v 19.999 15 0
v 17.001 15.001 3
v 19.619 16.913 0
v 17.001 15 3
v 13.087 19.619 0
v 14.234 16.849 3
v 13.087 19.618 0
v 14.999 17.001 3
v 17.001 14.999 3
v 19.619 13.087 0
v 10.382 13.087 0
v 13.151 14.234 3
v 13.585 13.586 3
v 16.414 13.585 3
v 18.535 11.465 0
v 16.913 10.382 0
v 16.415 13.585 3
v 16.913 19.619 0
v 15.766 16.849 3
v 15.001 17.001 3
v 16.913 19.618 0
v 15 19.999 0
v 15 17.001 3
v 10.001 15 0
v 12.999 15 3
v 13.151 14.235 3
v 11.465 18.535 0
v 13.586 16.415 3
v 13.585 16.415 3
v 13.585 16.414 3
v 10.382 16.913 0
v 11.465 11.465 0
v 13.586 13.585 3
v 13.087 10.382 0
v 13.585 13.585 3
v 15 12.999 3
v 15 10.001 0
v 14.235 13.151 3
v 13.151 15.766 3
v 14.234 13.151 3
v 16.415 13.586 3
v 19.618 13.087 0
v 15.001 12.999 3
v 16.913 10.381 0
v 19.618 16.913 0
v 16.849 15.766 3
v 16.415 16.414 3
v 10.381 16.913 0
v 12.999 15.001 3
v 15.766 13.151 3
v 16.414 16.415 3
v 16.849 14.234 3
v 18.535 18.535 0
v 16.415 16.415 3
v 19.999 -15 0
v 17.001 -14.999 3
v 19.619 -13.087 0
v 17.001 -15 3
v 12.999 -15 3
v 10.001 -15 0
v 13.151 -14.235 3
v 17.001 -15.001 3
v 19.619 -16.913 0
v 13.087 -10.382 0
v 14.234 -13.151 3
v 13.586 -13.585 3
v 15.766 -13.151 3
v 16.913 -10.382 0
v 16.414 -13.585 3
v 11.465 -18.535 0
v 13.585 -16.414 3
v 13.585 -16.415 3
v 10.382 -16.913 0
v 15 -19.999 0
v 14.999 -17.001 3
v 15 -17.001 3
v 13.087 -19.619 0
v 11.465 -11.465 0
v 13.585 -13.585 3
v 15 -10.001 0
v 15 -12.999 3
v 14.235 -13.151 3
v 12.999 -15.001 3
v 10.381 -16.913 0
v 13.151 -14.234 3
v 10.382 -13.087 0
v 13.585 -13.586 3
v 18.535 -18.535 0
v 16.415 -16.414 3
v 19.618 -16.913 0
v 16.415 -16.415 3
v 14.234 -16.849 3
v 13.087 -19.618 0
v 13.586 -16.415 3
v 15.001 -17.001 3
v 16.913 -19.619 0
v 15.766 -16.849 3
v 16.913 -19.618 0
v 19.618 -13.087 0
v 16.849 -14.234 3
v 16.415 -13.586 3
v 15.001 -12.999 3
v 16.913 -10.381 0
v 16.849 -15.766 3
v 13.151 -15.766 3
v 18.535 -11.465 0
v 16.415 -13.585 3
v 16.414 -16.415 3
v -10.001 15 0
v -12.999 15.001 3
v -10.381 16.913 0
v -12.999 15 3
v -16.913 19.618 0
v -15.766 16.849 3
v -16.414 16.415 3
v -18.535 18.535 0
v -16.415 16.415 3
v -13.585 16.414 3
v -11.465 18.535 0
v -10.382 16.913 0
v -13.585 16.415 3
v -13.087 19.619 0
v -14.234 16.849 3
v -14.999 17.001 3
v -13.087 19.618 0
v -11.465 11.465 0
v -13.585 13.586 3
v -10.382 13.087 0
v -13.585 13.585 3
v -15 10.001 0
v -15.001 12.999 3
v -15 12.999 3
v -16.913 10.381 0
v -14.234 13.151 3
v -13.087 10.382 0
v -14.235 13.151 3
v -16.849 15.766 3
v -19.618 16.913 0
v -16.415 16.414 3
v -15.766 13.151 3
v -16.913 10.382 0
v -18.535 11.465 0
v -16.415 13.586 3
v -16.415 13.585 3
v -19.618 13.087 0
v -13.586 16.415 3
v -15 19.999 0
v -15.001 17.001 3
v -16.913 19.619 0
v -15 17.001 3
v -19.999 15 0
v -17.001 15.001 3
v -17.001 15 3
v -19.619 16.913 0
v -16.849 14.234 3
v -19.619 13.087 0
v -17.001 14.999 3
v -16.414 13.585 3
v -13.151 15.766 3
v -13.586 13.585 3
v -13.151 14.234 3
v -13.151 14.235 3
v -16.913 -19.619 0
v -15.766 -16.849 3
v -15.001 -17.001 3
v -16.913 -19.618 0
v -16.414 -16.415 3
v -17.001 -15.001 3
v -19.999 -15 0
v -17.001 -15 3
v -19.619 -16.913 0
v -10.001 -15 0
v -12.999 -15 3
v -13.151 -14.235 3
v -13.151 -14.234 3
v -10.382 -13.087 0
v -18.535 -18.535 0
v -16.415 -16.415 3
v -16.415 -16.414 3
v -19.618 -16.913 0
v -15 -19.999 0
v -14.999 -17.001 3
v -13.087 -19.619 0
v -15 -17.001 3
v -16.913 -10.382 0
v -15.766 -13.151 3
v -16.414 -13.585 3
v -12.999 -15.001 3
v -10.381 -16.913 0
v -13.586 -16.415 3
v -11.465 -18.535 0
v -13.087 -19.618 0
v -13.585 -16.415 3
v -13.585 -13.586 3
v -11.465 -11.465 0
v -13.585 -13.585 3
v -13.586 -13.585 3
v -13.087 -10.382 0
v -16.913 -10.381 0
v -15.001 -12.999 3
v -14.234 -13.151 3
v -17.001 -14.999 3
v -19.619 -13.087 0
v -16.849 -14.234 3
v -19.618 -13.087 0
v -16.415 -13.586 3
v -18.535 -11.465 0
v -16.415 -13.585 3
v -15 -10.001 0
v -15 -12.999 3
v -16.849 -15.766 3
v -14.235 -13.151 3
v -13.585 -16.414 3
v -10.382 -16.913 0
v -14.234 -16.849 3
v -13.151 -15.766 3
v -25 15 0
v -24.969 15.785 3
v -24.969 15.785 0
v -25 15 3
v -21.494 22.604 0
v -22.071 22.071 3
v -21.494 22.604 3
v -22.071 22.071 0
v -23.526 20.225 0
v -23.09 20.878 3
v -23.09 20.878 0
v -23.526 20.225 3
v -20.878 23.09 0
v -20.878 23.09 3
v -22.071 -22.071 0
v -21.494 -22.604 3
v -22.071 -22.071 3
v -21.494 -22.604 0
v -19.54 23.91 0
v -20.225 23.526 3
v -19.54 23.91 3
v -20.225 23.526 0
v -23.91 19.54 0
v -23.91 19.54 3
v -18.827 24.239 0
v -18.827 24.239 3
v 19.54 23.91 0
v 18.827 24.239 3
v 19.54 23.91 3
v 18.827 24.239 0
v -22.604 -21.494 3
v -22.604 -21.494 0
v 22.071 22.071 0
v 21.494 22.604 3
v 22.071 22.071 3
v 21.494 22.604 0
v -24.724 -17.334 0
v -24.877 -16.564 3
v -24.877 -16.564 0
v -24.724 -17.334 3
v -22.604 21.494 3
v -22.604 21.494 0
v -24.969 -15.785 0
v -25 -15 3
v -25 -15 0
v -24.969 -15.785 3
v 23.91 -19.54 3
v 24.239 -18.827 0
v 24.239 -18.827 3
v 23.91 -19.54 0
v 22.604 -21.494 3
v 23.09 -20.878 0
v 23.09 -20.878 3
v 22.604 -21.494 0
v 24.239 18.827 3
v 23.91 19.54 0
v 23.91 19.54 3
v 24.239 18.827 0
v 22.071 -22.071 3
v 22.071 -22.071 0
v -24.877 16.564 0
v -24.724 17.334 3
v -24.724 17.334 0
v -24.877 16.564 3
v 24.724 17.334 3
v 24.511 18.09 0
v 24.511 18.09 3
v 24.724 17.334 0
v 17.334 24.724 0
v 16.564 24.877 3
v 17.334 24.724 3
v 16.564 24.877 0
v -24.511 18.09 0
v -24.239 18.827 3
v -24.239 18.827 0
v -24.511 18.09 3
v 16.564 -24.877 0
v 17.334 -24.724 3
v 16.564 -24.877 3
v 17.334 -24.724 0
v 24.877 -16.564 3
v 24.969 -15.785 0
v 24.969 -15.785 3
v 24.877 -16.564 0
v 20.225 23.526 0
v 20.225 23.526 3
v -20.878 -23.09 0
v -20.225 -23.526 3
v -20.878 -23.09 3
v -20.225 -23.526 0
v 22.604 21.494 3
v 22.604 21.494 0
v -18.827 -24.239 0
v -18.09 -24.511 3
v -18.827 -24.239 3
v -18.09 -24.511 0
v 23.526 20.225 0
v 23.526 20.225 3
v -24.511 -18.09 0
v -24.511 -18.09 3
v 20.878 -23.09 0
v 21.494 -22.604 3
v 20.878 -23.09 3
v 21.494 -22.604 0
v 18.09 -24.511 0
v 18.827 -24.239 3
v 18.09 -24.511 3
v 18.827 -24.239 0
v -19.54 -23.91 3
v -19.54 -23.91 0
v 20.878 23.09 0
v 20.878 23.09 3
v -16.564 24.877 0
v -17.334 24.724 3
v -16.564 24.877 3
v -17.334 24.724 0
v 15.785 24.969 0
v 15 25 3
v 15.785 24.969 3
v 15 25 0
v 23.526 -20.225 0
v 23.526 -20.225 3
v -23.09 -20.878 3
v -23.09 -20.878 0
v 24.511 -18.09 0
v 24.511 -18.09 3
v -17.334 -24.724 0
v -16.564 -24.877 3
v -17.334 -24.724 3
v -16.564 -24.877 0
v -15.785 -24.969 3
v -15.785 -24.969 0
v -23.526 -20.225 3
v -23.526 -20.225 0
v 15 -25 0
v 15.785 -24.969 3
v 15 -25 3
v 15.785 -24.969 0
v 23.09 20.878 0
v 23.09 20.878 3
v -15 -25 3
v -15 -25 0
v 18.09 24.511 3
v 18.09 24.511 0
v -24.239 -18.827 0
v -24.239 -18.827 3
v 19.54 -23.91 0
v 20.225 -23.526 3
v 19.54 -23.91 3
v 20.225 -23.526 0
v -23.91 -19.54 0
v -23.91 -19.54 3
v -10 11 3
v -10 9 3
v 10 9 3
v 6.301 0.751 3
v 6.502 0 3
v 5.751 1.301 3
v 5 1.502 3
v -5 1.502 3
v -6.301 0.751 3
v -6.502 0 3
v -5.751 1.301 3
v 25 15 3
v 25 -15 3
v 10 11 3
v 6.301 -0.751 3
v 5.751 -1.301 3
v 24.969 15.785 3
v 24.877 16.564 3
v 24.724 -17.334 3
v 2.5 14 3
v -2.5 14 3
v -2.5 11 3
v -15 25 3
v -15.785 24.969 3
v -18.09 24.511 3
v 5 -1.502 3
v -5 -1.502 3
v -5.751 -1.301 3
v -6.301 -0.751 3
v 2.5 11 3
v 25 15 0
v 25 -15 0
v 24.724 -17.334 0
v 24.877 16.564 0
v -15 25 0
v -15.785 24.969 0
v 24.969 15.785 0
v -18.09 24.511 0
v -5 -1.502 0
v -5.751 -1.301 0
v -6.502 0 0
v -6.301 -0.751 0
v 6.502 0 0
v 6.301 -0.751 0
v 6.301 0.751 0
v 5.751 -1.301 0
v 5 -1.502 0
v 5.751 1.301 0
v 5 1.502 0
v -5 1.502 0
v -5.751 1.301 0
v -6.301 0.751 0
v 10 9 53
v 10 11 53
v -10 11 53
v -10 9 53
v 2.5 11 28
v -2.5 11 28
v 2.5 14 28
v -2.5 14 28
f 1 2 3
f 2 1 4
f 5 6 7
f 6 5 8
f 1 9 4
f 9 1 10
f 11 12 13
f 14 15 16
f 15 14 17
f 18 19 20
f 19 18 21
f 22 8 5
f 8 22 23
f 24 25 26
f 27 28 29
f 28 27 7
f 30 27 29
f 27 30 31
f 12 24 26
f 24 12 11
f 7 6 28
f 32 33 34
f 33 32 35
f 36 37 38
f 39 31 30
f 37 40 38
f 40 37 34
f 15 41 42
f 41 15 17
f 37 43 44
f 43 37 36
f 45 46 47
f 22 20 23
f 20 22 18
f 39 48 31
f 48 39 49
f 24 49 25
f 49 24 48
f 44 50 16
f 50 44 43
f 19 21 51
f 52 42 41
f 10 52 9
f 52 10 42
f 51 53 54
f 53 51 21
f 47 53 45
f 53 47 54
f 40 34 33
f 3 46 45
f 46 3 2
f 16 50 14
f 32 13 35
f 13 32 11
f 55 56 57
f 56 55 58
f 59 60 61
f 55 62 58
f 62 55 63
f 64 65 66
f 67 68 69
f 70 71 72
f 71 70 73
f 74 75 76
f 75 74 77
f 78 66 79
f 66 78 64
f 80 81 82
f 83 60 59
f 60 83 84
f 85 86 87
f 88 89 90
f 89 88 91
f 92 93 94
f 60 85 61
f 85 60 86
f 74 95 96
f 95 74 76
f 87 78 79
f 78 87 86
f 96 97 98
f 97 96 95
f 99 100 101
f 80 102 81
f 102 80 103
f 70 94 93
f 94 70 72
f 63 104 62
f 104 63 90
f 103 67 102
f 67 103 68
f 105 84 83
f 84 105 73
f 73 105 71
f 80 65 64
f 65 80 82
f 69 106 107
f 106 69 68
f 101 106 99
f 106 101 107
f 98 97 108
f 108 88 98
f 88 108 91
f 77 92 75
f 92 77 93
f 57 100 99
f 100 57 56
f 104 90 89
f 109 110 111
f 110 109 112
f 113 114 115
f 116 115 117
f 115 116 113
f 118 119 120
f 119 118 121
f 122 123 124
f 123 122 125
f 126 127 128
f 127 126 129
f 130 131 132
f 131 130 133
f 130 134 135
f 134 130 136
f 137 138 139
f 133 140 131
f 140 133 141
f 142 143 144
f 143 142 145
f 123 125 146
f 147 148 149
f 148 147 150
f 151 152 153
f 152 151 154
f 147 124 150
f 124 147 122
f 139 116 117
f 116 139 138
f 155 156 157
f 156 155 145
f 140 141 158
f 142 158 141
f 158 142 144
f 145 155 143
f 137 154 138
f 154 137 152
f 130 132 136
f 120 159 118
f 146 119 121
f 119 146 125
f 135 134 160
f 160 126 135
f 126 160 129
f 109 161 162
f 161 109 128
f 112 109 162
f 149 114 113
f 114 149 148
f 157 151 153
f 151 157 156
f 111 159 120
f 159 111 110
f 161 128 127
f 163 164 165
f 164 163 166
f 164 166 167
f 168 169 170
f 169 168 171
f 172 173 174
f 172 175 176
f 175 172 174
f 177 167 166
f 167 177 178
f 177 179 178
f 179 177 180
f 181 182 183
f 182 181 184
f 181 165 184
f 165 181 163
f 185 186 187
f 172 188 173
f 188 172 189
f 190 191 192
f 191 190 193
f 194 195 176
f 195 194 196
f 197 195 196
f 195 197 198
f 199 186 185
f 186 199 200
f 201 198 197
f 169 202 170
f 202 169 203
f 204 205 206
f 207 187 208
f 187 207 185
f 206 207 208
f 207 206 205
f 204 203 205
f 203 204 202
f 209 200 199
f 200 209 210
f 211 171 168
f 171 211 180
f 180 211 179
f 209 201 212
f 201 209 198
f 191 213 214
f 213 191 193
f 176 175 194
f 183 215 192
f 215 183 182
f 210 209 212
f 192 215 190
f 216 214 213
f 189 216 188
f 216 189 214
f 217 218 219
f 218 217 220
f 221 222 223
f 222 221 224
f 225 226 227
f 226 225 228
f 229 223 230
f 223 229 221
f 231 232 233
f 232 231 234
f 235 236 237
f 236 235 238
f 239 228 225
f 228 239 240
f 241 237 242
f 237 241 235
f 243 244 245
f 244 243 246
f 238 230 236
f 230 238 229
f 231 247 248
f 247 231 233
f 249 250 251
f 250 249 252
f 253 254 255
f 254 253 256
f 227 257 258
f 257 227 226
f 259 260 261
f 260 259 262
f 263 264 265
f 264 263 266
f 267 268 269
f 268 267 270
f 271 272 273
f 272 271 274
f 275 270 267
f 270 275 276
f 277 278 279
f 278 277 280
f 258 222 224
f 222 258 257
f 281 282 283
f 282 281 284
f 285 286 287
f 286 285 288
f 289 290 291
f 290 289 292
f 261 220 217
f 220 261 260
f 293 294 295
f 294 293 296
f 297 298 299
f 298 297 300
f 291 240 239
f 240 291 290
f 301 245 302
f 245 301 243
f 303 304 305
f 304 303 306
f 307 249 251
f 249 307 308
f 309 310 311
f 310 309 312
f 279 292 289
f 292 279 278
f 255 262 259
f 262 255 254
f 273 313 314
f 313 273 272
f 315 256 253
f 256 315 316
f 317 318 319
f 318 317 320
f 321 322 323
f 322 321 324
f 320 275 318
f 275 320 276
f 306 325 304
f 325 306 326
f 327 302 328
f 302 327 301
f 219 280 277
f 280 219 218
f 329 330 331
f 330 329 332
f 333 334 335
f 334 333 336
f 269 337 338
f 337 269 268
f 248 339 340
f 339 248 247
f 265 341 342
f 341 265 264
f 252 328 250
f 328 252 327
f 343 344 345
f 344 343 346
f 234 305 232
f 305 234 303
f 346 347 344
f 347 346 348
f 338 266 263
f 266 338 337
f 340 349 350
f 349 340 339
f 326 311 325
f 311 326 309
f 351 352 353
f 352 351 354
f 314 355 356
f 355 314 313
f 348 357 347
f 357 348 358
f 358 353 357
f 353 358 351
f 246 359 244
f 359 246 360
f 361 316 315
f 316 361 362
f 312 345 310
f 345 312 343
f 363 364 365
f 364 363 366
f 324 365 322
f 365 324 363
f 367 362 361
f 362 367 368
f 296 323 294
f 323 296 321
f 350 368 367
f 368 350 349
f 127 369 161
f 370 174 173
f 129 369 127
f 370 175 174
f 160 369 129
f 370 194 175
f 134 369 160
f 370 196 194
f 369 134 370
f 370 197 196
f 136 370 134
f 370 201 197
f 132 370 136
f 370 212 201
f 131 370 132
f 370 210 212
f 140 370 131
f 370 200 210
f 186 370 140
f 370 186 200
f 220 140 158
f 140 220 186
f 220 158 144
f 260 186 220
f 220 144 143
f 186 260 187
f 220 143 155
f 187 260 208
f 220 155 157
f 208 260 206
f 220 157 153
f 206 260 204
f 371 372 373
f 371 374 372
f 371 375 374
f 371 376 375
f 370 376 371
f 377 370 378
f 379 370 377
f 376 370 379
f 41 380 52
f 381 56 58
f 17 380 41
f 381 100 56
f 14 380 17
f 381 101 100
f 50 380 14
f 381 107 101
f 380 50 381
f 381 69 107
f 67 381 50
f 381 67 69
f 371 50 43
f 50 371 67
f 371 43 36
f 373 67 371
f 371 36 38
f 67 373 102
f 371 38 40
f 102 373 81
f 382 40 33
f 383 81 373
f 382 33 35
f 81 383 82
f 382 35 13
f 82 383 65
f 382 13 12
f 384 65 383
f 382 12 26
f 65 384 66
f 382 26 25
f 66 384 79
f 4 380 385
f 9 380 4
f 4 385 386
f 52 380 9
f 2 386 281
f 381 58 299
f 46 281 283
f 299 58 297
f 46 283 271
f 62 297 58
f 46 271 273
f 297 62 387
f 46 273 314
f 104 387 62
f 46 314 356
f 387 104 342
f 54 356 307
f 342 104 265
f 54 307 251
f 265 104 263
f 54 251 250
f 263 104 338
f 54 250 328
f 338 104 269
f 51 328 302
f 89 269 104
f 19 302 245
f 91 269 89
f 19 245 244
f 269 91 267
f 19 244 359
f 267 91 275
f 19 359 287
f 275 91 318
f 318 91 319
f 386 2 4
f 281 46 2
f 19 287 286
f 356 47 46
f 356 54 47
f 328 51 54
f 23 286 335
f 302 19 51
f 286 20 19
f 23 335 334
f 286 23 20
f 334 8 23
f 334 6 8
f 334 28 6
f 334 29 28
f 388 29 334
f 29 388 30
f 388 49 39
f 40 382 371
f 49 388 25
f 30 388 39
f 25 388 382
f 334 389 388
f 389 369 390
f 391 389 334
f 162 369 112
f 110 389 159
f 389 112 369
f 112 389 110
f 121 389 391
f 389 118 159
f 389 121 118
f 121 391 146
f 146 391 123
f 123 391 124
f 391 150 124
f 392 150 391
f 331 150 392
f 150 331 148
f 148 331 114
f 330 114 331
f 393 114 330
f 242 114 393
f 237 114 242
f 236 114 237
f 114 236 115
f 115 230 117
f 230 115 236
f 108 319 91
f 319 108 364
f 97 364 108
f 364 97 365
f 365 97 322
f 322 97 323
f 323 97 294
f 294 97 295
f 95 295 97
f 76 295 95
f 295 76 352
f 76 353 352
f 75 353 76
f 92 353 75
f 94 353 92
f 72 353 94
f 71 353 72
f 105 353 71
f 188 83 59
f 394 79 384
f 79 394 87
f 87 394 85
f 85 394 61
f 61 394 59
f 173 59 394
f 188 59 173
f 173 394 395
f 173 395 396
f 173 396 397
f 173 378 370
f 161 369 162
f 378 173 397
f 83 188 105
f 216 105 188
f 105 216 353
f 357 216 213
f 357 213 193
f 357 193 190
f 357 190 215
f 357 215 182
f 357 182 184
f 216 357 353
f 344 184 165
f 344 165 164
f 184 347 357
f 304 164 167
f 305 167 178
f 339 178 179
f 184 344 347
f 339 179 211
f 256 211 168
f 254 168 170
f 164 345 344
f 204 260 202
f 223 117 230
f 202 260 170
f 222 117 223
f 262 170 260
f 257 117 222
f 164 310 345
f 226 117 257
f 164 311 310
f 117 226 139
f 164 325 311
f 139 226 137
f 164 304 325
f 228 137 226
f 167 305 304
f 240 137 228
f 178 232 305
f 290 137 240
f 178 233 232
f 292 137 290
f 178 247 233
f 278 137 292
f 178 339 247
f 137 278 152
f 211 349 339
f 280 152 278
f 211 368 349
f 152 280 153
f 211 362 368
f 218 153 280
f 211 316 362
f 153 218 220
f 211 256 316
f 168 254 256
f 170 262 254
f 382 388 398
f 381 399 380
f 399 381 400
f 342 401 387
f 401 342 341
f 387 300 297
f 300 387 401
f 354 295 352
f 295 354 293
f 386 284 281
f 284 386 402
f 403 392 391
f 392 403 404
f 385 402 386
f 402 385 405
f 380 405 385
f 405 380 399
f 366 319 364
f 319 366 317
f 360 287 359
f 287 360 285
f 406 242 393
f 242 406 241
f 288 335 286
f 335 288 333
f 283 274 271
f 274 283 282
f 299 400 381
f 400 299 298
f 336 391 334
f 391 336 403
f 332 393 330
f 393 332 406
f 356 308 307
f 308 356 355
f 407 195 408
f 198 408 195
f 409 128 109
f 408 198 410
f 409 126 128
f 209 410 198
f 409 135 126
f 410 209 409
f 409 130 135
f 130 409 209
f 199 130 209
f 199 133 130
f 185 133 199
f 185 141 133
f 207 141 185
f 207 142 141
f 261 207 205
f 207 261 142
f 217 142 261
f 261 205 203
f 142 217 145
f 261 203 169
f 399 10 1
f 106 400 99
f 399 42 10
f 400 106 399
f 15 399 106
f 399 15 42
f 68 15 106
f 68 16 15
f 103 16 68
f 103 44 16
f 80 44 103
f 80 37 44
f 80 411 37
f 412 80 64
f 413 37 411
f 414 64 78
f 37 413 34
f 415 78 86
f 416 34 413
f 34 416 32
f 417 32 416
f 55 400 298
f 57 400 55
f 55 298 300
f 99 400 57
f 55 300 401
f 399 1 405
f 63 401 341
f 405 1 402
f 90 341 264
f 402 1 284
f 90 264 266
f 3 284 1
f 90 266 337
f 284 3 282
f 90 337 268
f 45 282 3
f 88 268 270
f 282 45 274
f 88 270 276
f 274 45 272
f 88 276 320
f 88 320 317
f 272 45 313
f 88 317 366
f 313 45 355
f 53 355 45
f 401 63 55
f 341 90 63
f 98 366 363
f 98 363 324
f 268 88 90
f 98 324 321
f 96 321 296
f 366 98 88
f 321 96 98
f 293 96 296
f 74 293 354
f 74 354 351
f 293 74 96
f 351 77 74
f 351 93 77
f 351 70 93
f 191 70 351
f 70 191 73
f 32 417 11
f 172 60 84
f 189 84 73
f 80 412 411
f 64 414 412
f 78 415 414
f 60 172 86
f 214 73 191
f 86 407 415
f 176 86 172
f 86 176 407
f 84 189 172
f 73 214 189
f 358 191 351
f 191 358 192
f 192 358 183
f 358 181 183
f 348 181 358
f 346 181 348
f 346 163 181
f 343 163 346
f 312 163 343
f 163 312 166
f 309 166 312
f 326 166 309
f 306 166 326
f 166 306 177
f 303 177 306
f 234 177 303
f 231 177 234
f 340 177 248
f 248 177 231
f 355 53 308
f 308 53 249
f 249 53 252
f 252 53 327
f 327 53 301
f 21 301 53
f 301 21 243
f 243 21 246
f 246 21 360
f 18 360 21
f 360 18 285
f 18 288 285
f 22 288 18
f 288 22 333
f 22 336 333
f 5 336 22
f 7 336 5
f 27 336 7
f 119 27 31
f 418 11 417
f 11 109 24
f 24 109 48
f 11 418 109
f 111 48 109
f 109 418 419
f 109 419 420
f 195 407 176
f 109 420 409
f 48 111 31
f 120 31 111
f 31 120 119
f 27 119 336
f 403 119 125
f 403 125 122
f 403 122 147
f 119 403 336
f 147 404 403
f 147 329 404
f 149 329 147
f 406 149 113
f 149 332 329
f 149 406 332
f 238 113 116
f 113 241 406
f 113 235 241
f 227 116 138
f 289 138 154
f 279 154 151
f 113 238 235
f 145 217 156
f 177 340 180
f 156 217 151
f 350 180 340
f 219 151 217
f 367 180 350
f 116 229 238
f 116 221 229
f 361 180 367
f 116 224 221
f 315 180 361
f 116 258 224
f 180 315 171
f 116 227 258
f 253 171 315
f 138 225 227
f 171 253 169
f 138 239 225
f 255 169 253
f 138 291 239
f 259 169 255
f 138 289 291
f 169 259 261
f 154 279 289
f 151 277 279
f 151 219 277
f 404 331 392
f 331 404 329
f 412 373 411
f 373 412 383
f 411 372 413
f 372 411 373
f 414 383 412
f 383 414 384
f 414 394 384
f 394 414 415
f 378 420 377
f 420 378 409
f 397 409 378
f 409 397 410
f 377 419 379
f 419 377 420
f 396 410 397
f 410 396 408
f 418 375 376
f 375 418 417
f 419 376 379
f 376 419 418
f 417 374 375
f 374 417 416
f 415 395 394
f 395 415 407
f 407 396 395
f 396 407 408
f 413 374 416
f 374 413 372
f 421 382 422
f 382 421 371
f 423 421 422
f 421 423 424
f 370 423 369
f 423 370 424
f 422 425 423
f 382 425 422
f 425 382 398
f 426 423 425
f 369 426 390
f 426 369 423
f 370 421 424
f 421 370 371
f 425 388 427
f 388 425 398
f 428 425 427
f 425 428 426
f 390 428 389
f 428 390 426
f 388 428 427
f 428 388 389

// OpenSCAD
// file: lib.scad
module bettersphere(r) {
   sphere(r, $fn=8*r);
}

module bettercylinder(h, r) {
   cylinder(h=h, r=r, $fn=8*r);
}

module roundedcube(dims, rounding, only_sides=false) {
    if (only_sides) {
        translate([rounding, rounding, 0]) {
            minkowski() {
                bettercylinder(1, rounding);
                cube(dims - [2*rounding, 2*rounding, 1]);
            }
        }
    } else {
        translate([rounding, rounding, rounding]) {
            minkowski() {
                cube(dims - [2*rounding, 2*rounding, 2*rounding]);
                bettersphere(rounding);
            }
        }
    }
}

//roundedcube([20, 50, 30], 3, only_sides=false);

module roundedcylinder(h, r, rounding) {
    translate([0, 0, rounding]) {
        minkowski()  {
            cylinder(h = h - 2*rounding, r = r - rounding);
            bettersphere(rounding);
        }
    }
}

//roundedcylinder(50, 20, 5);

module centercube(size) {
    translate([-size/2, -size/2, -size/2]) cube(size);
}

module hollowcylinder(h, ir, or) {
    difference() {
        bettercylinder(h, or);
        
        translate([0, 0, -0.001])
        bettercylinder(h+0.002, ir);
    }
}
// main file
use <lib.scad>

panel_w = 50;
panel_h = 3;
panel_r = 10;

module_l = 50;
module_w = 20;
module_port_h = 10; // distance between port bottom and module bottom

module_plate_t = 2;
module_plate_support_w = 5;
module_plate_support_t = 4;

screw_offset = panel_w / 2 - panel_r;
screw_r1 = 5; // screw head
screw_r2 = 2; // screw thread

module usbc_cutout() {
    usbc_h = 3;
    usbc_w = 10;
    usbc_l = 10;
    
    hull(){
        for (x = [-usbc_w/2, usbc_w/2]) {
            translate([x, 0, -0.001])
            bettercylinder(usbc_l, usbc_h/2 + 0.002);        
        }
    }
}
 
difference() {    
    translate([-panel_w/2, -panel_w/2, 0])
    roundedcube([panel_w, panel_w, panel_h], panel_r, only_sides=true);
    
    // screw holes
    for (x = [screw_offset, -screw_offset]) {
        for (y = [screw_offset, -screw_offset]) {
            translate([x, y, -0.001])
            cylinder(h=panel_h + 0.002, r1=screw_r1, r2=screw_r2);
        }
    }
    
    usbc_cutout();
}

translate([0, module_port_h, module_l/2+panel_h])
cube([module_w, module_plate_t, module_l], center=true);

translate([0, module_port_h + module_plate_t, module_l/4+panel_h])
cube([module_plate_support_w, module_plate_support_t, module_l / 2], center=true);
